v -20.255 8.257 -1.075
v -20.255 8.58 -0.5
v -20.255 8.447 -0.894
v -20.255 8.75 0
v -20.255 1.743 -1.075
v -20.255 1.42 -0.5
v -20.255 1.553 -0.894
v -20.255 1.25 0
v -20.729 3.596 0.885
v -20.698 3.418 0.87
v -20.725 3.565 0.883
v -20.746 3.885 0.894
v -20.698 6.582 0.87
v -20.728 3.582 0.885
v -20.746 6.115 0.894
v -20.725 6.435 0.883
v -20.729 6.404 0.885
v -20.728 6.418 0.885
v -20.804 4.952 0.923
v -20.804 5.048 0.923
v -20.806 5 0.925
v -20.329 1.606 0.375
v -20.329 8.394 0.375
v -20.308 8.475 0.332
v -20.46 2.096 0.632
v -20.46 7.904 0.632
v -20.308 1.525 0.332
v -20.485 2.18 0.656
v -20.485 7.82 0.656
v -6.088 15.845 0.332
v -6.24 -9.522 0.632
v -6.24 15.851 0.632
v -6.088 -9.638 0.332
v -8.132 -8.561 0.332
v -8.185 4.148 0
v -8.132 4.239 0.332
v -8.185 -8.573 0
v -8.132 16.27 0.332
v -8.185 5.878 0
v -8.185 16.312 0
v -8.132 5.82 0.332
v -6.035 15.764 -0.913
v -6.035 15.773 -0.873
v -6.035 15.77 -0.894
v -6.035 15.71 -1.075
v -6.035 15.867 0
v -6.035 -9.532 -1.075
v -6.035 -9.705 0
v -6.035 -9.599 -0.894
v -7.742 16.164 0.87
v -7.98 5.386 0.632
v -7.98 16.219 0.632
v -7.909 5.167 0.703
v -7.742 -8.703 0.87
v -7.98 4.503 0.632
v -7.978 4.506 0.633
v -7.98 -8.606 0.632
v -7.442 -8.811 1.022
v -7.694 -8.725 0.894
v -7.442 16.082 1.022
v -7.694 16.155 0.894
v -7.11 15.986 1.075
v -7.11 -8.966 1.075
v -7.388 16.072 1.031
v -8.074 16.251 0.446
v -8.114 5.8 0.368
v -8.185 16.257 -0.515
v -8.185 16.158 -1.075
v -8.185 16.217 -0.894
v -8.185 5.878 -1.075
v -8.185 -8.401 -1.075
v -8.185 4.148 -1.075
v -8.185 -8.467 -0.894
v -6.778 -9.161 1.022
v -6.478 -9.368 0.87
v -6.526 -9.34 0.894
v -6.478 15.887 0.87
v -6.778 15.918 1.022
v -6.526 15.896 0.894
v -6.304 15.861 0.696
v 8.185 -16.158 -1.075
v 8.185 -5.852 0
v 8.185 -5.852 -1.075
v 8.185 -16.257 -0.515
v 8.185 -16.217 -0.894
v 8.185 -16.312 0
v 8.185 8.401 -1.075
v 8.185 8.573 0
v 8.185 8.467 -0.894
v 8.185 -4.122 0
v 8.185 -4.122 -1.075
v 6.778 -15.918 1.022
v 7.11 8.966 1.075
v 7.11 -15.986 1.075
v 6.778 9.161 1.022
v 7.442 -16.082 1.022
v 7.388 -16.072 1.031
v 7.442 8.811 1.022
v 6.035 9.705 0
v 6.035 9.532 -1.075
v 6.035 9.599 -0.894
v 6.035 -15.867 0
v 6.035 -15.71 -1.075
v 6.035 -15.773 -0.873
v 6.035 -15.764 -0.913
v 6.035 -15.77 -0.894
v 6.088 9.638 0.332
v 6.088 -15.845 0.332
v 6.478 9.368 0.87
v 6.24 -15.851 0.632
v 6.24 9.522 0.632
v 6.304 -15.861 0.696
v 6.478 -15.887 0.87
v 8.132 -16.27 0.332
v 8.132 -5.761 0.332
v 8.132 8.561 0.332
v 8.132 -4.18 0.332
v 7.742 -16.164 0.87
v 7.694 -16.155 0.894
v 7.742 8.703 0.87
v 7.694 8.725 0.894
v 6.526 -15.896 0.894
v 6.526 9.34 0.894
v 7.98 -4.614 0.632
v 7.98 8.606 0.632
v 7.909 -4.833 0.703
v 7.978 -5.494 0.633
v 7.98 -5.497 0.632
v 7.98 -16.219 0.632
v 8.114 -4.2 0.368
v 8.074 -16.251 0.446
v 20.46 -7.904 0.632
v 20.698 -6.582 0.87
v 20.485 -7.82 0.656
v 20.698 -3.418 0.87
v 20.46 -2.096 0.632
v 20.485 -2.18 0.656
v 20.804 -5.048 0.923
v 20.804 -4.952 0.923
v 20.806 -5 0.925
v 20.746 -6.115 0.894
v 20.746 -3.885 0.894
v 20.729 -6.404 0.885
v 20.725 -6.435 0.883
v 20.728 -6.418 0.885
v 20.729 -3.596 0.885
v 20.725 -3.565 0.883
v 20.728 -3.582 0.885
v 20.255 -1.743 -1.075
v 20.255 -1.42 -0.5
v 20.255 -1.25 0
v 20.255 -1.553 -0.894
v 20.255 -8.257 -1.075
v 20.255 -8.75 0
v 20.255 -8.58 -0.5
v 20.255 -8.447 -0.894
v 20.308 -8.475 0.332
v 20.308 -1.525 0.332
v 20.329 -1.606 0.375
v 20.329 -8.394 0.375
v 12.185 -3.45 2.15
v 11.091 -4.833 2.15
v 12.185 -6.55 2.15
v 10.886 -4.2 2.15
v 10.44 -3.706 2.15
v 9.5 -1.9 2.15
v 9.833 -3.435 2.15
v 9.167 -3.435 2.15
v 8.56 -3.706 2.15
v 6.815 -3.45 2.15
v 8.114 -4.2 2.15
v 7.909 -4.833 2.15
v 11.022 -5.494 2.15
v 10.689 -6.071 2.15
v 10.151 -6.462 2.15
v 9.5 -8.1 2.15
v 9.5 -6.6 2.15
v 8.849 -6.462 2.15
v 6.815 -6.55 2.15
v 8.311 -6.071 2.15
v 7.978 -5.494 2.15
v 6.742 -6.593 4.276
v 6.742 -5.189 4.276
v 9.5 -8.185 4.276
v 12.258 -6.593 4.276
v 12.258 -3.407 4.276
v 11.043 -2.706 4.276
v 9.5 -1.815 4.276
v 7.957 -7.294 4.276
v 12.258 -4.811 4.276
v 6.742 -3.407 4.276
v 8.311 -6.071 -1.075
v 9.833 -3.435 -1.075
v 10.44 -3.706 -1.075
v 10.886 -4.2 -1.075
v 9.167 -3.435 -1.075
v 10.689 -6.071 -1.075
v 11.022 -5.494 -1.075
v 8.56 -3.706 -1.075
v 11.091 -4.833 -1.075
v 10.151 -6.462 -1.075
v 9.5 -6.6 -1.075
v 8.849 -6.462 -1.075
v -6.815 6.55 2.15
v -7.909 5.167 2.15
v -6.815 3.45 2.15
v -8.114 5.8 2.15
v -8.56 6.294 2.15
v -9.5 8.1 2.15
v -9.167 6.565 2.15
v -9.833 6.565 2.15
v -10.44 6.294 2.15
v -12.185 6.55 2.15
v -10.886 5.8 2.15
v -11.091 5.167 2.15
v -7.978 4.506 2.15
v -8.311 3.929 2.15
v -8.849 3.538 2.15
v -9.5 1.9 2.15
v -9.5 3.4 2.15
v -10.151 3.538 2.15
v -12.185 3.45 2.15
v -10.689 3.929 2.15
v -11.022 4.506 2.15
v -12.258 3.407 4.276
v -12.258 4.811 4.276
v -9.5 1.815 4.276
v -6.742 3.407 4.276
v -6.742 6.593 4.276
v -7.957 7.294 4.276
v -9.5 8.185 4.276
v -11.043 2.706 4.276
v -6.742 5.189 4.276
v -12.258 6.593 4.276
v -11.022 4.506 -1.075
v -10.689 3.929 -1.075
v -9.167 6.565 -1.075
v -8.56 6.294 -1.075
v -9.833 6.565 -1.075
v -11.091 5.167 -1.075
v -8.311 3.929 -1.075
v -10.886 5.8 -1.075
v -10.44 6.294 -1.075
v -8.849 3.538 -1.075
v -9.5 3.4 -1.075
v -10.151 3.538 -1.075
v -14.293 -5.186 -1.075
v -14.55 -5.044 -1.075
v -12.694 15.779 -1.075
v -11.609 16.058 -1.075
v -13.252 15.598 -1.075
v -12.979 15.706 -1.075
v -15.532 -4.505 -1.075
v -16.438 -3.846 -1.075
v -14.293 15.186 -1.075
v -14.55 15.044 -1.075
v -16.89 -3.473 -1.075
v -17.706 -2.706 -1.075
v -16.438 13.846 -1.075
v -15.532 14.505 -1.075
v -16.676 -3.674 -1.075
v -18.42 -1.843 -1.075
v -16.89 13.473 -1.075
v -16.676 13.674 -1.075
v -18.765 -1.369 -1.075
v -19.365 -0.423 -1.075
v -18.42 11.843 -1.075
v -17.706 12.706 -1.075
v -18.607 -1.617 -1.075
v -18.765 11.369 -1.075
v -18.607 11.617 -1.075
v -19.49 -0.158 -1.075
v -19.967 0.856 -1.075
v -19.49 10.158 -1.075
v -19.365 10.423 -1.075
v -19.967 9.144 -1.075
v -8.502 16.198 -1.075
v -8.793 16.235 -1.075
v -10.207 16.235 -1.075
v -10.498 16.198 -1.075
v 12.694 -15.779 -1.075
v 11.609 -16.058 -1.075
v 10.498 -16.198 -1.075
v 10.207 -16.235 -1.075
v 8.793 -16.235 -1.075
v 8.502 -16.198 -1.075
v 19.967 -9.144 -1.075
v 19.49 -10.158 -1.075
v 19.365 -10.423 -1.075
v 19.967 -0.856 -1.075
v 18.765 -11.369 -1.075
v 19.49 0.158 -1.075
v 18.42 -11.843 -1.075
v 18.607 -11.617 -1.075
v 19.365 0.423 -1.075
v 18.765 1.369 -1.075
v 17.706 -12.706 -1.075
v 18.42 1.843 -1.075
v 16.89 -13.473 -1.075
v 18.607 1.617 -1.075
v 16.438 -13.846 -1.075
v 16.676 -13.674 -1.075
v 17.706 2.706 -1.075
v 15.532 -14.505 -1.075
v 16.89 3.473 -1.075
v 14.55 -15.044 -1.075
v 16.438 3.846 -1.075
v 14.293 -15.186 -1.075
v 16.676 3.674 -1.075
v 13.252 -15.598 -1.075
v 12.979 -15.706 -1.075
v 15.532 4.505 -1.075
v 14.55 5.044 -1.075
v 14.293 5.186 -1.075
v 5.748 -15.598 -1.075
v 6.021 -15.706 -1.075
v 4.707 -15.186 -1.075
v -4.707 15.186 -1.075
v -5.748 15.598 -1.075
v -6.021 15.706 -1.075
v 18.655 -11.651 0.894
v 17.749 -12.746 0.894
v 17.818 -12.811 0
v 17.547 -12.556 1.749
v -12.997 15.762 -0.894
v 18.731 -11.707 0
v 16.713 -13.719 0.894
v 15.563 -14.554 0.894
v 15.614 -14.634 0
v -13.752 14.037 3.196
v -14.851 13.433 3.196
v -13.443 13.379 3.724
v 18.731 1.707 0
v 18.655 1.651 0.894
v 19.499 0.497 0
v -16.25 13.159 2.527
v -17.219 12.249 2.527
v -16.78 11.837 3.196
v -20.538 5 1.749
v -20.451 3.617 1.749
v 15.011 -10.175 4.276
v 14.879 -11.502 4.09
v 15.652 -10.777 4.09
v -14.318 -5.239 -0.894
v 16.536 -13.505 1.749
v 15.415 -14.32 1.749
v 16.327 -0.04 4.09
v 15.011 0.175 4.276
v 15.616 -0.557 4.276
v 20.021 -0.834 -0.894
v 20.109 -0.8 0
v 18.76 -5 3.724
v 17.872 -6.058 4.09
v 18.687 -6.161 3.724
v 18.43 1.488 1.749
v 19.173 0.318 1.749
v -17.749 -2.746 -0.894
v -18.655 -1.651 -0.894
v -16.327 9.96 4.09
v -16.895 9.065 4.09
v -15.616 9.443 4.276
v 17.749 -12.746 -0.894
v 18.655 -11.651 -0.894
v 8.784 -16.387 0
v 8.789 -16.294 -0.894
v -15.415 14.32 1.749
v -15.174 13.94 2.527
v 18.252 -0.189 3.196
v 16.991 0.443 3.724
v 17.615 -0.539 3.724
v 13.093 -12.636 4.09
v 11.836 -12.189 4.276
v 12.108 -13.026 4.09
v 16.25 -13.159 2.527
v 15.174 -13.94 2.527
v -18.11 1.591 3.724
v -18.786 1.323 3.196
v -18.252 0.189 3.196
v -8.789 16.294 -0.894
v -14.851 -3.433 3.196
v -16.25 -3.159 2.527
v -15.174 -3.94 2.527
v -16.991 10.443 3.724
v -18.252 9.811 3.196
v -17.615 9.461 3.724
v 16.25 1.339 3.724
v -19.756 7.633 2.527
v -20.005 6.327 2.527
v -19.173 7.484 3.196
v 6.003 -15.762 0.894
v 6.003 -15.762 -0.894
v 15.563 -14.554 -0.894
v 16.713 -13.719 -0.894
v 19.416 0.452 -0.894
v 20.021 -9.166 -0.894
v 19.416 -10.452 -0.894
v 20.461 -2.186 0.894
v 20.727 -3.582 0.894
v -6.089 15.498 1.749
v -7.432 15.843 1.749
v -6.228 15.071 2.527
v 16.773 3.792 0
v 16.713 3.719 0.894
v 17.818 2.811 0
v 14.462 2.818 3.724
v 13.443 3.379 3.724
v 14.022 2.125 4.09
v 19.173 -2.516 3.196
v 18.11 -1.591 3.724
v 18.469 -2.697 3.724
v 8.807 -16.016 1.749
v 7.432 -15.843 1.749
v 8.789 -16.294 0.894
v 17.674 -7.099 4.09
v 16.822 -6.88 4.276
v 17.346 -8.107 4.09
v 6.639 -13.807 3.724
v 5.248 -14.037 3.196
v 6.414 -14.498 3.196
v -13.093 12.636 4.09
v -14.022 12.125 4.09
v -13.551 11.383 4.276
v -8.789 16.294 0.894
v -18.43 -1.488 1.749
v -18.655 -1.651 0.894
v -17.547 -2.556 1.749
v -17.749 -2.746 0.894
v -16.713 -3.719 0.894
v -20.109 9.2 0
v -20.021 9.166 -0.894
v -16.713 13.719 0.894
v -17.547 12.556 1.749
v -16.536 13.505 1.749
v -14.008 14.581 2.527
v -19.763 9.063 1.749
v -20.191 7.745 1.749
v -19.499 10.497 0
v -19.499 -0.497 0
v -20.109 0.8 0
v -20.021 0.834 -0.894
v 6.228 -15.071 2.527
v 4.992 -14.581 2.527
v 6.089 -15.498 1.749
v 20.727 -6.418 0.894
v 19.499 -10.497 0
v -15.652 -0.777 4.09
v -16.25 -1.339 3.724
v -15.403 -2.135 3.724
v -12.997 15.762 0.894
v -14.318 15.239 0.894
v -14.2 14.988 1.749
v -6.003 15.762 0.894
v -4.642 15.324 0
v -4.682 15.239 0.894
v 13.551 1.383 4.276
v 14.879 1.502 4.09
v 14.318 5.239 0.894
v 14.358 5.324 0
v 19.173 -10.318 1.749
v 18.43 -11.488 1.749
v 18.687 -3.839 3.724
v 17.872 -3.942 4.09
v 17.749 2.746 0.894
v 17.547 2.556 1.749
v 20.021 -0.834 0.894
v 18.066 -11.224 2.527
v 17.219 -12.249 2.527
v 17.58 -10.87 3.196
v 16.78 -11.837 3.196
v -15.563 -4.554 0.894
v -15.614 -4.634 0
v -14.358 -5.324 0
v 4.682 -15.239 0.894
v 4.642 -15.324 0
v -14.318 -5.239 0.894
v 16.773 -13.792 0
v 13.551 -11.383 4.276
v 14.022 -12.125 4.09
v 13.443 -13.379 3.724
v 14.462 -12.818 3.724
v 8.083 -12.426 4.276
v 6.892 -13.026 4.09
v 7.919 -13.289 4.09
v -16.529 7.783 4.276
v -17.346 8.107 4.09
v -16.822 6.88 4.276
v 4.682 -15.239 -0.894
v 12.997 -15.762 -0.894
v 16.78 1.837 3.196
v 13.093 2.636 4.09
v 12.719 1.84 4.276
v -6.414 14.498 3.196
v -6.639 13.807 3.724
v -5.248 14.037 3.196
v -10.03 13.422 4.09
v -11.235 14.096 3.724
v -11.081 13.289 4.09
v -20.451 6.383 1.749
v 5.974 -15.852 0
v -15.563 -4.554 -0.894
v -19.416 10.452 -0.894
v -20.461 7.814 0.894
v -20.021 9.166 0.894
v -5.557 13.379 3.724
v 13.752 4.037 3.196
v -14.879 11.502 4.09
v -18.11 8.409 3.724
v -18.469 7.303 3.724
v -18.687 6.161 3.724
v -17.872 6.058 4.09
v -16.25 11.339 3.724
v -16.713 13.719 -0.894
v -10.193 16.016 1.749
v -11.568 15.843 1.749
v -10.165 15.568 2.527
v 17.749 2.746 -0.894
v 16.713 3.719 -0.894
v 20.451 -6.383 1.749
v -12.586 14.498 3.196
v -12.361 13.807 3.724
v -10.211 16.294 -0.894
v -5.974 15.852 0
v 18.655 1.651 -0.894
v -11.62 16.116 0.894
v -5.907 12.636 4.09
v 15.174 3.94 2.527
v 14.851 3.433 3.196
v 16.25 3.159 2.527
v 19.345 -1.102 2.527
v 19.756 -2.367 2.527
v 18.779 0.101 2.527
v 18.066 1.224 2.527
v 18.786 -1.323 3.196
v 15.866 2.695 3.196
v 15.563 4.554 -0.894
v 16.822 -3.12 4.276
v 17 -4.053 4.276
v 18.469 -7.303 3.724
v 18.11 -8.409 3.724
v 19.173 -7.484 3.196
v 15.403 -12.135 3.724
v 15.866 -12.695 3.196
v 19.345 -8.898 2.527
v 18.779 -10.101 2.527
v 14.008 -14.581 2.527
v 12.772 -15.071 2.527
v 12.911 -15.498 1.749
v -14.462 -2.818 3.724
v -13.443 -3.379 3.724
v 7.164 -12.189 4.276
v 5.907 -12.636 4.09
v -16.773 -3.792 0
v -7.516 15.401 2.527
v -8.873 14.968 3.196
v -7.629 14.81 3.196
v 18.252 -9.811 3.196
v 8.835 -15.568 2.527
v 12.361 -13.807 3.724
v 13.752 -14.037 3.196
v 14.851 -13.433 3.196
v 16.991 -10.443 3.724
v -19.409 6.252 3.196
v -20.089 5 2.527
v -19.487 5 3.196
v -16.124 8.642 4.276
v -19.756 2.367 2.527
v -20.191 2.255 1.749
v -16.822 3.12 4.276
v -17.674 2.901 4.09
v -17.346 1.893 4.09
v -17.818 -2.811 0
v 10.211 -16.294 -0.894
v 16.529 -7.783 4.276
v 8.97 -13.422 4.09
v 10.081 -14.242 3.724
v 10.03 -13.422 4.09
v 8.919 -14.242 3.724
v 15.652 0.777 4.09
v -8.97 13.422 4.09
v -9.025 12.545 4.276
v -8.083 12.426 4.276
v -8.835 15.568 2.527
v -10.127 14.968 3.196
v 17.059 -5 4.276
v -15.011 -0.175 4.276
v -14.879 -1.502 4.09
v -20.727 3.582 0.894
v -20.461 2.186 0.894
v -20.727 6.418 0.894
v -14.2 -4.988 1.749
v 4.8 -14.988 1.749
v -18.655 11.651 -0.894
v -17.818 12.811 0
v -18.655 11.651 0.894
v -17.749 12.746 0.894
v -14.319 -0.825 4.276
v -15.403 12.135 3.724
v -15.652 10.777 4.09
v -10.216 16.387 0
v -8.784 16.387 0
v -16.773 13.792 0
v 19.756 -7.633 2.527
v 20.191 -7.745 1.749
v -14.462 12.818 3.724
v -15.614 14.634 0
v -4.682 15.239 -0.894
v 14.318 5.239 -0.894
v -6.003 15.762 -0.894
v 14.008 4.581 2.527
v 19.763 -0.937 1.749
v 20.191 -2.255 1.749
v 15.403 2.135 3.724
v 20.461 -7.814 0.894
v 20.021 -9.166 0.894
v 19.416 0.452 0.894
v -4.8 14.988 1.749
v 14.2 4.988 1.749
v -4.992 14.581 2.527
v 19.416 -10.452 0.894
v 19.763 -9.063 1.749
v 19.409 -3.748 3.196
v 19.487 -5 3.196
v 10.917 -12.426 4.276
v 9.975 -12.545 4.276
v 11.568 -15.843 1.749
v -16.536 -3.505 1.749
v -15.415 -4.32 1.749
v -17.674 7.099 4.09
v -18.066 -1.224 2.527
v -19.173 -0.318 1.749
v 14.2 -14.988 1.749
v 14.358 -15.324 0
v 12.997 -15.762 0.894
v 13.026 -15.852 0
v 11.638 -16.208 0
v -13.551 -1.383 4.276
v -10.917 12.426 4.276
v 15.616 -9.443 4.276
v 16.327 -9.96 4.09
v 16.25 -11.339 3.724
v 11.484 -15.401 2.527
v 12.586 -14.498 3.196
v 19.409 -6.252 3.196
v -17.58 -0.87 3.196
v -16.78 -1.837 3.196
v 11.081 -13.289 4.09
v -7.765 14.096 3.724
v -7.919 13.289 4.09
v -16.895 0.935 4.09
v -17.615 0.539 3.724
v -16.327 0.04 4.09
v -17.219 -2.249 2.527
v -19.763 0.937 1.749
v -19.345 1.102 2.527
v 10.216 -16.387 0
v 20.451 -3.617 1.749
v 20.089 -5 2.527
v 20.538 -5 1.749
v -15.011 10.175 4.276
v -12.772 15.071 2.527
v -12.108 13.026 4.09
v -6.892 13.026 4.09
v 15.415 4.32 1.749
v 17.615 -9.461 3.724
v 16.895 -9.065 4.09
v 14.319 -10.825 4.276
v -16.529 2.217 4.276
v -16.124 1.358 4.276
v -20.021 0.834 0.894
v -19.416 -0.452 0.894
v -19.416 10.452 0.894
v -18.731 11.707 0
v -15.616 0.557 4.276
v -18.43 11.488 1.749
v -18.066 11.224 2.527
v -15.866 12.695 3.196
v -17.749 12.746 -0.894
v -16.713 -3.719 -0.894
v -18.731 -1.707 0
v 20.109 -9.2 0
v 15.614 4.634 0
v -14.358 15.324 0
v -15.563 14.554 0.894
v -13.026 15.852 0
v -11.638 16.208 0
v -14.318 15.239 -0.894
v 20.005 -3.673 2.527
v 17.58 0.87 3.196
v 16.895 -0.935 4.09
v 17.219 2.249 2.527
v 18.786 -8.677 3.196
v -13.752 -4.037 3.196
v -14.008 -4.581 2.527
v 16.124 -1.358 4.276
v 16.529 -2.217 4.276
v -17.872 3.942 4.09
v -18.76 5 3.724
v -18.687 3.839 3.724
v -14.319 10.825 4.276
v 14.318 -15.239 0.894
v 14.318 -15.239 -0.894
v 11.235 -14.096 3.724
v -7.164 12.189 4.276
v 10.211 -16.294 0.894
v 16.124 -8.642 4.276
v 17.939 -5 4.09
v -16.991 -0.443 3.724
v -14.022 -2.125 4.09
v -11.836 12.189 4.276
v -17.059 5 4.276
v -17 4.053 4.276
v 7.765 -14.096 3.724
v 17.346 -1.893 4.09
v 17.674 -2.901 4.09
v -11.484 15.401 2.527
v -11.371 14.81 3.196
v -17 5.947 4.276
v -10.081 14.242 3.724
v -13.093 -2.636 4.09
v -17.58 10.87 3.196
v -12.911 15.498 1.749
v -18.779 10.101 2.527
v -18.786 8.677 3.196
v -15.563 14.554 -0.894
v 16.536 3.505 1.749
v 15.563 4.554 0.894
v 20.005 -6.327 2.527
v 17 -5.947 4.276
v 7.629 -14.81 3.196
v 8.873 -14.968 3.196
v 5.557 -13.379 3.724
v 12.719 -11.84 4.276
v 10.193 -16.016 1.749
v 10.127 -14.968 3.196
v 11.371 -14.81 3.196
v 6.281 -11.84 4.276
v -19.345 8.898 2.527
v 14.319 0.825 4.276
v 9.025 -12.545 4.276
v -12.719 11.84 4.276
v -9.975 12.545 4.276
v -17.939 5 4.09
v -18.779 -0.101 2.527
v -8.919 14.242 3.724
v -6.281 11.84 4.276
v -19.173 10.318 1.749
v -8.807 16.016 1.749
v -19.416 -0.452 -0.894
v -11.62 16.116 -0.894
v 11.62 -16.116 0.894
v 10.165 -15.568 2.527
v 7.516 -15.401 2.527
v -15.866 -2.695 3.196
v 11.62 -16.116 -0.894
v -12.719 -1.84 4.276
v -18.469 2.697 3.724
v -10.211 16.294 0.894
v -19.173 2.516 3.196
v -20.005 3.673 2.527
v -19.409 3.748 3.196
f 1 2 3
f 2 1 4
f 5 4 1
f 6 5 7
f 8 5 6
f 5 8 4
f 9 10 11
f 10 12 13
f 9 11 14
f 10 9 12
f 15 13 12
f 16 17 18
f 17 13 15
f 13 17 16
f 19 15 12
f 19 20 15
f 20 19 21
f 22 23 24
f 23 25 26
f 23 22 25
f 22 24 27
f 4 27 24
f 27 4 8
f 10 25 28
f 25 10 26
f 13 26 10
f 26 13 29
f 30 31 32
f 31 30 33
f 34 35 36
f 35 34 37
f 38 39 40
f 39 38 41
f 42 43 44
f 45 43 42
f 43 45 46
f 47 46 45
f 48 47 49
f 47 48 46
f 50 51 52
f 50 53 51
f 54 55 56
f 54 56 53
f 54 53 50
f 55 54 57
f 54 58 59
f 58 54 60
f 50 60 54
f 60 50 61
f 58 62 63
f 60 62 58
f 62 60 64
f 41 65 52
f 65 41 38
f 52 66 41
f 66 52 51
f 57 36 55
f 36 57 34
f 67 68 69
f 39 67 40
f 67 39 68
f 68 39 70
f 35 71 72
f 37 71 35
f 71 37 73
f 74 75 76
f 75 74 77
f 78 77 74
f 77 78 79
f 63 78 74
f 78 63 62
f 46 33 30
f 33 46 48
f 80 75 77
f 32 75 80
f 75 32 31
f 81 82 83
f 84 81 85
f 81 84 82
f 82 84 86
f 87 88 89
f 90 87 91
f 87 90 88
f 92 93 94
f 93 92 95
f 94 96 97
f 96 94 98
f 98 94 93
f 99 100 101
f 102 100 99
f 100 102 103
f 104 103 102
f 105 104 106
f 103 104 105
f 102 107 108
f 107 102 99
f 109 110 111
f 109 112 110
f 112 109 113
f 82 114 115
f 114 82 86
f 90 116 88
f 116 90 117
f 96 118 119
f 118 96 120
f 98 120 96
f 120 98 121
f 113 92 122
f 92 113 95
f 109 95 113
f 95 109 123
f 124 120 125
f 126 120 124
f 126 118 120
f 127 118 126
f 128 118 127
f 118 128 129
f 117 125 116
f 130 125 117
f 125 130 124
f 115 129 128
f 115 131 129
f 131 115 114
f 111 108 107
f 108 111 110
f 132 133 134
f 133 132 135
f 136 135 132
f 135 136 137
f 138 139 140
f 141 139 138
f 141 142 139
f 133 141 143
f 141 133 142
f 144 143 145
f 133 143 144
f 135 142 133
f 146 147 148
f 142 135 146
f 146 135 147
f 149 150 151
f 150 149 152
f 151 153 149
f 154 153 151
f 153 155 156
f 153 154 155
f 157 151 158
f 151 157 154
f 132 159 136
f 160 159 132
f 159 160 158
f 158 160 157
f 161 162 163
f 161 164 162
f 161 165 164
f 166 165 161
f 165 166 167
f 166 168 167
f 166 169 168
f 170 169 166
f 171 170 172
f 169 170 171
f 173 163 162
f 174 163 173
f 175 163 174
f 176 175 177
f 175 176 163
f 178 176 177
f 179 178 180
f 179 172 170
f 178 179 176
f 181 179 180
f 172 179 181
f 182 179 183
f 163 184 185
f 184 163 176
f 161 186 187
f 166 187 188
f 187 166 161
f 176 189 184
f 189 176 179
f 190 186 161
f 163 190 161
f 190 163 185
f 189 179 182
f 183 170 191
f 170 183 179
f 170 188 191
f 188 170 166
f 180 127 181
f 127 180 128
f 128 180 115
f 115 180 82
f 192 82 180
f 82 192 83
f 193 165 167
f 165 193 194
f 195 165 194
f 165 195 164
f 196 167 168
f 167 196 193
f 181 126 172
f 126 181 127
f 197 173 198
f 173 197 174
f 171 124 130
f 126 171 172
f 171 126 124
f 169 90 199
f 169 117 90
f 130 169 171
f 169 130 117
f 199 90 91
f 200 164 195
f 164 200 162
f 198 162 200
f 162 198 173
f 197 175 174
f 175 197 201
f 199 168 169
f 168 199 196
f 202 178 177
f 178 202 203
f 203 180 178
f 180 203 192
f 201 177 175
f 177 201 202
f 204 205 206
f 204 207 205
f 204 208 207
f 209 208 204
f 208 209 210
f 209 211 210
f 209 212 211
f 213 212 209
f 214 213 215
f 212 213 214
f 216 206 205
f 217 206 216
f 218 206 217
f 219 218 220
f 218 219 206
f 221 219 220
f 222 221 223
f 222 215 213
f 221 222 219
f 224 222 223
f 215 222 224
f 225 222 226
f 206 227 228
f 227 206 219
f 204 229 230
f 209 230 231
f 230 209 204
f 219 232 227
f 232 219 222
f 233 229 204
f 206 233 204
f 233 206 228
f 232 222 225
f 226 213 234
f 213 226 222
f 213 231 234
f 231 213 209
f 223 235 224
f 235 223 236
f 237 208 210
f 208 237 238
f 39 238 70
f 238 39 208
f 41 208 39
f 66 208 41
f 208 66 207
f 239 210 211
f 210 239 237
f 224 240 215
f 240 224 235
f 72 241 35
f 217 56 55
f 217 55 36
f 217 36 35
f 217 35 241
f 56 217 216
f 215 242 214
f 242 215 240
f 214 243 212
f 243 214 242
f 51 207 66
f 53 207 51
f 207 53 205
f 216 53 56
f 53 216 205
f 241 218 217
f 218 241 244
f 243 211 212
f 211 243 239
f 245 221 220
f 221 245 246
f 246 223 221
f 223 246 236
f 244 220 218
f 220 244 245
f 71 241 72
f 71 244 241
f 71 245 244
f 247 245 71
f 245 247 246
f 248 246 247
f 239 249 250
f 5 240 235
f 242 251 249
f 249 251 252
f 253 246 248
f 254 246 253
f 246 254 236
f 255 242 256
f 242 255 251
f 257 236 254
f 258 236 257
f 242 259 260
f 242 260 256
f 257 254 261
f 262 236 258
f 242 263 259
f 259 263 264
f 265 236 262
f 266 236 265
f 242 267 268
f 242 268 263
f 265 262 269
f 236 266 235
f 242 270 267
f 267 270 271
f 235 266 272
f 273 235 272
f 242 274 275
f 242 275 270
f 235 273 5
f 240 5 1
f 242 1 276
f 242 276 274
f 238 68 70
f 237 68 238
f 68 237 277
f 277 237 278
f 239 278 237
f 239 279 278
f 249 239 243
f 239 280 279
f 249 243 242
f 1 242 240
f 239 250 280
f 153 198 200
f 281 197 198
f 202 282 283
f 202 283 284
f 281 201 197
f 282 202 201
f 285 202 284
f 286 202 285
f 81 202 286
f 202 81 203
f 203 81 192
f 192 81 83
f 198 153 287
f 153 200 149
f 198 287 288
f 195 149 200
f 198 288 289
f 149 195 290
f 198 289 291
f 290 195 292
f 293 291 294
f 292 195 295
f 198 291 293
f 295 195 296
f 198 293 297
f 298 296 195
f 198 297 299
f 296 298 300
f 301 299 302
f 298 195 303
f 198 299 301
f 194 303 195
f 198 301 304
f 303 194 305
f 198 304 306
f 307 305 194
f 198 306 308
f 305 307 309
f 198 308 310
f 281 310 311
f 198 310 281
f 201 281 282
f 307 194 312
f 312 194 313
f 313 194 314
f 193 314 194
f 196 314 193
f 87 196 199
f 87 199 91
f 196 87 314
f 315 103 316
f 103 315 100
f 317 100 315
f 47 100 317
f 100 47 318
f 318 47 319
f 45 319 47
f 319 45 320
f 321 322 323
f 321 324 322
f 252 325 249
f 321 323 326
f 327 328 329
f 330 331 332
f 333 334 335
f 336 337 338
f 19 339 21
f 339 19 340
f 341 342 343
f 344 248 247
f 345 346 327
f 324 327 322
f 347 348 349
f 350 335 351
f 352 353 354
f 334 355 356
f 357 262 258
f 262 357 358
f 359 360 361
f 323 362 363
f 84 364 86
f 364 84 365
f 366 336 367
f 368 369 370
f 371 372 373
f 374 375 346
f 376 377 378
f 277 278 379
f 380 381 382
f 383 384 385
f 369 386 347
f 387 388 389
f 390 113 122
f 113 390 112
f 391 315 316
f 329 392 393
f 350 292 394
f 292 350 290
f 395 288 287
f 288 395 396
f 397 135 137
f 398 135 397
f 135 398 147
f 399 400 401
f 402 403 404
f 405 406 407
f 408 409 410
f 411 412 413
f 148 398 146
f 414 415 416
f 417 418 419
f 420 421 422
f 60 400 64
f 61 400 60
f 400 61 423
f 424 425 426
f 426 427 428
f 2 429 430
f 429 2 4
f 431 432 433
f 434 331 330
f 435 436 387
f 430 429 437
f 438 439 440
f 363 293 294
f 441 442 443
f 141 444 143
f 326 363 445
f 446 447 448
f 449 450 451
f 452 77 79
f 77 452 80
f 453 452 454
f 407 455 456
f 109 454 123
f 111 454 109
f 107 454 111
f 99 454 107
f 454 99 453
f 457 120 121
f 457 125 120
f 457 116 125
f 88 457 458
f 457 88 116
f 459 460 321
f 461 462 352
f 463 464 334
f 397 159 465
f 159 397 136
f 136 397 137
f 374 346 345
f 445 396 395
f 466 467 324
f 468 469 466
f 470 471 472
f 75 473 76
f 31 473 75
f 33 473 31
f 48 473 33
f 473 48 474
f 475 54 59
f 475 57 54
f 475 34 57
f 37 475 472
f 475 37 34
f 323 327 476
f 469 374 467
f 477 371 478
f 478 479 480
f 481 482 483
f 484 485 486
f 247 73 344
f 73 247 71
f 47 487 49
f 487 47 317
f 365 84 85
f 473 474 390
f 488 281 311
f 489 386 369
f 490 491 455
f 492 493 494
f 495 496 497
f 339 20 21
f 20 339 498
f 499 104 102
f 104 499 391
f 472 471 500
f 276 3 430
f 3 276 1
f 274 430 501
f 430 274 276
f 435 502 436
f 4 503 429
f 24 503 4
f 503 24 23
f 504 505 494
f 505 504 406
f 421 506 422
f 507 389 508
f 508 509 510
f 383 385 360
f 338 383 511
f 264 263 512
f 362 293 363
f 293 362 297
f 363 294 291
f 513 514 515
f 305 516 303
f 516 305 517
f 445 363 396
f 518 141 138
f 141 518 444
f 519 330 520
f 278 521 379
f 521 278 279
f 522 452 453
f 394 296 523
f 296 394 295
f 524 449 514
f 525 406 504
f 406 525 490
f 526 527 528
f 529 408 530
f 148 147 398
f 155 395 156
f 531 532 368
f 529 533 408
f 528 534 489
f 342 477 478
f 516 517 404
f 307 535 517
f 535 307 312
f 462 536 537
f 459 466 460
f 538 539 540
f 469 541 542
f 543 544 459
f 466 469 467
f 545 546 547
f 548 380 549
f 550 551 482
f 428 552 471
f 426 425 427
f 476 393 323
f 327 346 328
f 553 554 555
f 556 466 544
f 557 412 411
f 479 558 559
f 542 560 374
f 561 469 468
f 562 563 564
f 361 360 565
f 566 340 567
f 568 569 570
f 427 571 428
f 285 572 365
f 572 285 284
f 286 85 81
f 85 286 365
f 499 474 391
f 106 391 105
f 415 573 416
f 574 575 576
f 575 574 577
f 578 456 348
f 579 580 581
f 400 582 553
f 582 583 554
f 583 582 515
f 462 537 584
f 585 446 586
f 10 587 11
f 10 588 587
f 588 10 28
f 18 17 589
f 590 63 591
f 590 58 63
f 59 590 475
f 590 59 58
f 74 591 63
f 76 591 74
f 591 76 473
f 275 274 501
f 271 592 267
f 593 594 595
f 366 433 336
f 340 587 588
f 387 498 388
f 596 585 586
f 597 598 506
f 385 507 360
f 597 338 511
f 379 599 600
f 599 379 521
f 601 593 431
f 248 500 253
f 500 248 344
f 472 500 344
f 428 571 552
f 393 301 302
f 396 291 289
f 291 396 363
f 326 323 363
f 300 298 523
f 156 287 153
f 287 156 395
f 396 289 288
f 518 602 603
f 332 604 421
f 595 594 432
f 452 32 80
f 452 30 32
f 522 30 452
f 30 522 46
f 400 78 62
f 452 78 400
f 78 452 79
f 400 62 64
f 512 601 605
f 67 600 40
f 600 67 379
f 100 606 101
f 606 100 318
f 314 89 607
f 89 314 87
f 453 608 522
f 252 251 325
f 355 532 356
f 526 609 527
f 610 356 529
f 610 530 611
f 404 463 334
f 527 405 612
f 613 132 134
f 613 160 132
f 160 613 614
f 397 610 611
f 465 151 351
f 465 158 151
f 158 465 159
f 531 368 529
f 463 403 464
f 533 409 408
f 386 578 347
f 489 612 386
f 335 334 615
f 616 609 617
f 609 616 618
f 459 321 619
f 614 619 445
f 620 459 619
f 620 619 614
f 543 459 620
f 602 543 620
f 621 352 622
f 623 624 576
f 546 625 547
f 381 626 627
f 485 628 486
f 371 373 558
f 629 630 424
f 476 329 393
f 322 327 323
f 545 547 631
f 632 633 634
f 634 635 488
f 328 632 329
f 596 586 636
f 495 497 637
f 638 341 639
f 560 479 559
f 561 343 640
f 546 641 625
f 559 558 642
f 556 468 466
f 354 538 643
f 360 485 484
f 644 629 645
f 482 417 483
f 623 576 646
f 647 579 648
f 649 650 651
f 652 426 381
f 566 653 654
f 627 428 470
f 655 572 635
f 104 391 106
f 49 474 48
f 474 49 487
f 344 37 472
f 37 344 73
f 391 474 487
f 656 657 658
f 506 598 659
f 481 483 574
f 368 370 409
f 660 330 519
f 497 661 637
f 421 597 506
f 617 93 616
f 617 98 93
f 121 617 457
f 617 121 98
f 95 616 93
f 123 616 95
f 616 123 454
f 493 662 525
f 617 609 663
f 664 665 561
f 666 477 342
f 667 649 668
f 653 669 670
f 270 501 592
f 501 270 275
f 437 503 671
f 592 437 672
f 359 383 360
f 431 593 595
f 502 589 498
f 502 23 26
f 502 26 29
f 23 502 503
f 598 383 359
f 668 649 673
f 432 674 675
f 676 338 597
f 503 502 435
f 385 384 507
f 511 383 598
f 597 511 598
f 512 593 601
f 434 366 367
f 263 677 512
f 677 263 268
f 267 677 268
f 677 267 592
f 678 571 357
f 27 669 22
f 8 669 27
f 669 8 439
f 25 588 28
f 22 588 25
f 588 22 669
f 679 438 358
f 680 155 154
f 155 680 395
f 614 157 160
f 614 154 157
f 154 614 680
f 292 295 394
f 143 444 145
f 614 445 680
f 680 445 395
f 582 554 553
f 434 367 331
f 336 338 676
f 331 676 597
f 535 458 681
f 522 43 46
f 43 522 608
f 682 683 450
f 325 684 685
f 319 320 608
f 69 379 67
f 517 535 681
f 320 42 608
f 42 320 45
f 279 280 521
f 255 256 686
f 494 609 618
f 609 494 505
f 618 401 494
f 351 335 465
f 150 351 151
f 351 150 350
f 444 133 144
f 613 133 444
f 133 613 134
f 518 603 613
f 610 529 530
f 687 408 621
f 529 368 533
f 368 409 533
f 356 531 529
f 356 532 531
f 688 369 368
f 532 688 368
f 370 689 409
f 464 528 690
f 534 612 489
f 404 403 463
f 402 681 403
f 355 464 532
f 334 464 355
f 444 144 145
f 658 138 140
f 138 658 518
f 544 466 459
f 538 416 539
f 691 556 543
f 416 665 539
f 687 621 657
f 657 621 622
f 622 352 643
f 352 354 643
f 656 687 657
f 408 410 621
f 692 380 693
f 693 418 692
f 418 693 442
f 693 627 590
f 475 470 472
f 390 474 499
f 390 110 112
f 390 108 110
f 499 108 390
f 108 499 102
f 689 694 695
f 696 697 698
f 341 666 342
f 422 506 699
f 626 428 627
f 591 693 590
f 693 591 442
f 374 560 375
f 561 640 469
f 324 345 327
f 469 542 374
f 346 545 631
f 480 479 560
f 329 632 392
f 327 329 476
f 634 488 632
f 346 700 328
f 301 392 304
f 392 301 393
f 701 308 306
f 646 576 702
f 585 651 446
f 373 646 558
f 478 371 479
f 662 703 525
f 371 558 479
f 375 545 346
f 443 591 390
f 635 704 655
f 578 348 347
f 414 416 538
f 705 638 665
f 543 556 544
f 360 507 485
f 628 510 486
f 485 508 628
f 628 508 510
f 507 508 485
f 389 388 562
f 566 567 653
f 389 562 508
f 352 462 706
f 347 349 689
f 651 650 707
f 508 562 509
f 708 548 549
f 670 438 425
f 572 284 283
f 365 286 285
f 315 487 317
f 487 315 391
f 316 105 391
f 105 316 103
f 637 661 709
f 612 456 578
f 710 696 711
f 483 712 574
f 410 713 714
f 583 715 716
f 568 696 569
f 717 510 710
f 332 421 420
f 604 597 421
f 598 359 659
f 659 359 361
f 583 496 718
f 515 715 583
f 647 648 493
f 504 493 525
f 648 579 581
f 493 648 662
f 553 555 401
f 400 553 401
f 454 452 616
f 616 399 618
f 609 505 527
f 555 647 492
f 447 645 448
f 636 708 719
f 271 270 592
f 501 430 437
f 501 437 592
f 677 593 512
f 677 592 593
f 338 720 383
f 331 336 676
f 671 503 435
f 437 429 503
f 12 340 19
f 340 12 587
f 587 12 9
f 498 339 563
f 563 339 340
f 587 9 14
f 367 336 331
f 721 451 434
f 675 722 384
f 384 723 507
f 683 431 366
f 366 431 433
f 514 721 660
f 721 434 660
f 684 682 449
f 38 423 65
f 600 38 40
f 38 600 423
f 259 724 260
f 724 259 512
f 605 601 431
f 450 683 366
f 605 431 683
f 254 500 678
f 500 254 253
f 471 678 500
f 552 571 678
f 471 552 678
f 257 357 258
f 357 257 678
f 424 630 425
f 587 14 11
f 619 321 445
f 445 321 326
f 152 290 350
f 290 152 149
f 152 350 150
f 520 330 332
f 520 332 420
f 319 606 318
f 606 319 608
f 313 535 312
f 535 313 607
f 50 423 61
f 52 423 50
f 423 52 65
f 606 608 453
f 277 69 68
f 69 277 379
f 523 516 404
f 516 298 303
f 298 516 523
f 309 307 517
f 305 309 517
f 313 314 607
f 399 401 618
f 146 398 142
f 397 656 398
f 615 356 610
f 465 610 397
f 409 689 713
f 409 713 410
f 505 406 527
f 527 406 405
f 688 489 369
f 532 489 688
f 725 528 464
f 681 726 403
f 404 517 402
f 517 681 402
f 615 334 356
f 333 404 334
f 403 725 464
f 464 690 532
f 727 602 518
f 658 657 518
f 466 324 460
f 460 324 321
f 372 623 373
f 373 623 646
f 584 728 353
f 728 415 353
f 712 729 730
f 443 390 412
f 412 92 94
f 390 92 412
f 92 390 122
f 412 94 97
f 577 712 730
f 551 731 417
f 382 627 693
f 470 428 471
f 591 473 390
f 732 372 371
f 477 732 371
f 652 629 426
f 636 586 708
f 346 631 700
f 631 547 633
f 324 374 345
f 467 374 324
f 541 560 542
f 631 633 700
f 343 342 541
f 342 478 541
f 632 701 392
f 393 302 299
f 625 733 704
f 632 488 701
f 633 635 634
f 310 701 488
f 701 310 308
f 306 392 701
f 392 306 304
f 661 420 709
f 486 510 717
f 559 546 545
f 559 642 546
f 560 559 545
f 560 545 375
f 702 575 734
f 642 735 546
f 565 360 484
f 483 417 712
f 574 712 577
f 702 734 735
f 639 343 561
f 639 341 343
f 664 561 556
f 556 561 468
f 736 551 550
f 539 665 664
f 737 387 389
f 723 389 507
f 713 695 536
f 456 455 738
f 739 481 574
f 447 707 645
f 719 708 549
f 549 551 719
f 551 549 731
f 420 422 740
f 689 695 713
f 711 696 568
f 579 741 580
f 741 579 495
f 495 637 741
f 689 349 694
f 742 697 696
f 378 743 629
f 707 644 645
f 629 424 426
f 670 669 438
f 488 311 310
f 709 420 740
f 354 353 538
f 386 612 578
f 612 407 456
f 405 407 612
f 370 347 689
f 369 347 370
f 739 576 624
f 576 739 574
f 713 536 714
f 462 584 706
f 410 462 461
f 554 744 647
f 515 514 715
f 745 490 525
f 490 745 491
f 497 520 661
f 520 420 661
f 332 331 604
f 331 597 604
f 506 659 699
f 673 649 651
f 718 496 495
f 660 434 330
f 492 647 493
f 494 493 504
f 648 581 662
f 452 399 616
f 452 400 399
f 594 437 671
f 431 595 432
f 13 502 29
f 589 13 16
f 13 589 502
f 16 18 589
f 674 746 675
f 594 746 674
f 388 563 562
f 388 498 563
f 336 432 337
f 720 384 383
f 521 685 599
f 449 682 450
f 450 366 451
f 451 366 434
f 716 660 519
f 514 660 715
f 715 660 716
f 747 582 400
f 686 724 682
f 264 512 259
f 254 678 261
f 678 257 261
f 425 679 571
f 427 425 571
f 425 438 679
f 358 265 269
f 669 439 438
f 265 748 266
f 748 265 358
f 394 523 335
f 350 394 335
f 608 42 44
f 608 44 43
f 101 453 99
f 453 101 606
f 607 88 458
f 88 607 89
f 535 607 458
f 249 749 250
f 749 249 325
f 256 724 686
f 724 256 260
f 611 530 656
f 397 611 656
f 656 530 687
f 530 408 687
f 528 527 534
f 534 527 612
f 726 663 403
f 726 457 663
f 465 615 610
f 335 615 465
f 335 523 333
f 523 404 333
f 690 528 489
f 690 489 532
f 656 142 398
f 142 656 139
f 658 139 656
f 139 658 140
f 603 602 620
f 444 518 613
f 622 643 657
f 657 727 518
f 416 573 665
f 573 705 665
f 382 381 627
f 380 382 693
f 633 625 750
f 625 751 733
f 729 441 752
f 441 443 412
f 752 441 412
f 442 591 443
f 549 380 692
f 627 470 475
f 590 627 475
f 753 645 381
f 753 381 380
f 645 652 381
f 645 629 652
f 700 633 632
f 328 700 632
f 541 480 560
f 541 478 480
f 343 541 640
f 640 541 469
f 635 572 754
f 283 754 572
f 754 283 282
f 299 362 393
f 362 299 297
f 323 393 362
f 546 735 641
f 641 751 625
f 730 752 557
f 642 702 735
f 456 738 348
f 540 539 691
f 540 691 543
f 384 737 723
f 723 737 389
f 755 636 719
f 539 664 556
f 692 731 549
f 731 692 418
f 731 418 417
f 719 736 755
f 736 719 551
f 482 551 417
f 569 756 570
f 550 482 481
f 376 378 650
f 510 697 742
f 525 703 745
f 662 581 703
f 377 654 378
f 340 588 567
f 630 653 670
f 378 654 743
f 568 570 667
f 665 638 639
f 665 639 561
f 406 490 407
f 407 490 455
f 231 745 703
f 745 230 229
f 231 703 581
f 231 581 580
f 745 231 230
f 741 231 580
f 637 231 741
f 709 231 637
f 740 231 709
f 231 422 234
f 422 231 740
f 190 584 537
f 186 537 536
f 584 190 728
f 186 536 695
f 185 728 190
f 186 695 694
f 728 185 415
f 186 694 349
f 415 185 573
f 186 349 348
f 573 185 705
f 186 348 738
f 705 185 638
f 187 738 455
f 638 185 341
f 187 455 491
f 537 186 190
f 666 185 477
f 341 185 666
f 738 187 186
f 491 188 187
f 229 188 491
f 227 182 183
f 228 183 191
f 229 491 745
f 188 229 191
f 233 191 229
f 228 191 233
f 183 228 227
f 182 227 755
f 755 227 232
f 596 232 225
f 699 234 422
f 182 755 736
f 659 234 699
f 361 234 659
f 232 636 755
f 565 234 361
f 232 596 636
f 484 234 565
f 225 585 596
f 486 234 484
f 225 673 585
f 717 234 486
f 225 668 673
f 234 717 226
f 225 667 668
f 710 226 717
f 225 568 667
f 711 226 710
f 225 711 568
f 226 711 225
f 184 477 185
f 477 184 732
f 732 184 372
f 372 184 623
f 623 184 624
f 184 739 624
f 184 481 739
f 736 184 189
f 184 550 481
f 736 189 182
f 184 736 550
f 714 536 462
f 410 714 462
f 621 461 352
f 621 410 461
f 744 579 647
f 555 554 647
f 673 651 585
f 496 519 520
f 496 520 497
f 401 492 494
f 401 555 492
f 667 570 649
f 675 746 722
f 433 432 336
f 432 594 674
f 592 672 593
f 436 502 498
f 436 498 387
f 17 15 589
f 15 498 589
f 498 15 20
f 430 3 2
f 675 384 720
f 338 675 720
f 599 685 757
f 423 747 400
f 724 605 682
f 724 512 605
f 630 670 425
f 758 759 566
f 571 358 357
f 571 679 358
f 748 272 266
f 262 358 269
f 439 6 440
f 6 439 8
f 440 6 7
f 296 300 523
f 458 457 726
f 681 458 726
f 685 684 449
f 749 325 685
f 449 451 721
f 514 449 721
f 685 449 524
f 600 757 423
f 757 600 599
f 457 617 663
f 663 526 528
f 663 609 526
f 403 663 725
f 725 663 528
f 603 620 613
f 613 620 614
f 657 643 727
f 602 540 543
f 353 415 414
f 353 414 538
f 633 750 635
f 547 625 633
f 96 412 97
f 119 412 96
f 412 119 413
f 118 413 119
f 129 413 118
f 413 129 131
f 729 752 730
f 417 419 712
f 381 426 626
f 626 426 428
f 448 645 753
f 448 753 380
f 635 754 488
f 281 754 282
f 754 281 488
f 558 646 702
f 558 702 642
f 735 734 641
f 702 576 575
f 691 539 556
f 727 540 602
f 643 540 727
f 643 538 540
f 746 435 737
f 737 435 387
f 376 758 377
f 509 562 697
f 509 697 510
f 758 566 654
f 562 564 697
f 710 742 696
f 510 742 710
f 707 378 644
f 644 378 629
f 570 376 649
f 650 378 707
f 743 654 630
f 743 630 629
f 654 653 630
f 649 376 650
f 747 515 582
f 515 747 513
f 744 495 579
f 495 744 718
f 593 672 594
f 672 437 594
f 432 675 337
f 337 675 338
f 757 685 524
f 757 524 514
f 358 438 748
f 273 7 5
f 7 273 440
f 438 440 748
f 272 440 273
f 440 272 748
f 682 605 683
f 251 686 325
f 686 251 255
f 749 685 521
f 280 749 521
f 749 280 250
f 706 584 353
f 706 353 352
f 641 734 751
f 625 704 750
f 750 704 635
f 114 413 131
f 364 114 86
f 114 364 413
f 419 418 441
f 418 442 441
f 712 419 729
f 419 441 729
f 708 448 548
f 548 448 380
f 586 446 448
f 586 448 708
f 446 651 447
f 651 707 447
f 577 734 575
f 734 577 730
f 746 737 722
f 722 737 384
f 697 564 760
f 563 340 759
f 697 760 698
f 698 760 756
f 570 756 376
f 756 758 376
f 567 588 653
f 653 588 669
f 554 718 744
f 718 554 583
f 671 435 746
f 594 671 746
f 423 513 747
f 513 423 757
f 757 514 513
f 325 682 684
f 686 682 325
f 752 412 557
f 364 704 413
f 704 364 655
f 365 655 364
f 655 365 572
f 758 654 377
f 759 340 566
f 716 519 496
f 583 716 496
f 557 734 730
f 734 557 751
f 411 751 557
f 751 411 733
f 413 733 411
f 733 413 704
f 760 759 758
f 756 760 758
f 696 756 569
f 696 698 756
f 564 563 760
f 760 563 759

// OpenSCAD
// file: M3.scad
module M3_spacer() {
    union(){
        cylinder( 5, 3.1, 3.3, false, $fn = 6);
        translate([0, 0, -4.9])cylinder(  10, 1.6, 1.6, true, $fn = 15);
    };
}

/*
difference(){
    cube([9,9,6],true);
    M3_spacer ();
}
*/

//M3_spacer();
// main file
include <M3.scad>

thickness = 2.15;
distance = 14.22;

x = 19;
y = -10;

difference(){
    hull(){
    translate ([x/2, y/2, 0])
        rotate_extrude(convexity = 10, $fn = 50)
            translate([distance * 0.5, 0, 0])
                circle(r = thickness * 2, $fn = 30);
    translate ([-x/2, -y/2, 0])
        rotate_extrude(convexity = 10, $fn = 50)
            translate([distance * 0.5, 0, 0])
                circle(r = thickness * 2, $fn = 30);
    }
    union(){
        for (i = [-distance* 1.5, -distance/2, distance/2, distance* 1.5])
            translate ([i, 0, 0]) 
                hull(){
                    rotate ([90, 0, 0])
                    cylinder (distance*3, thickness/2, thickness/2, true, $fn = 20);
                    translate([0, 0, -thickness * 2])rotate ([90, 0, 0])
                    cylinder (distance*4, thickness/2, thickness/2, true, $fn = 20);
                }
        translate ([0, 0, -distance - thickness/2]) cylinder (distance * 2, distance*5, distance*5, true);   
        translate ([x/2, y/2, 0])
            translate([0, 0, thickness])rotate ([0, 0, 30])M3_spacer();      
        translate ([-x/2, -y/2, 0])
            translate([0, 0, thickness])rotate ([0, 0, 30])M3_spacer();  
    }
}
